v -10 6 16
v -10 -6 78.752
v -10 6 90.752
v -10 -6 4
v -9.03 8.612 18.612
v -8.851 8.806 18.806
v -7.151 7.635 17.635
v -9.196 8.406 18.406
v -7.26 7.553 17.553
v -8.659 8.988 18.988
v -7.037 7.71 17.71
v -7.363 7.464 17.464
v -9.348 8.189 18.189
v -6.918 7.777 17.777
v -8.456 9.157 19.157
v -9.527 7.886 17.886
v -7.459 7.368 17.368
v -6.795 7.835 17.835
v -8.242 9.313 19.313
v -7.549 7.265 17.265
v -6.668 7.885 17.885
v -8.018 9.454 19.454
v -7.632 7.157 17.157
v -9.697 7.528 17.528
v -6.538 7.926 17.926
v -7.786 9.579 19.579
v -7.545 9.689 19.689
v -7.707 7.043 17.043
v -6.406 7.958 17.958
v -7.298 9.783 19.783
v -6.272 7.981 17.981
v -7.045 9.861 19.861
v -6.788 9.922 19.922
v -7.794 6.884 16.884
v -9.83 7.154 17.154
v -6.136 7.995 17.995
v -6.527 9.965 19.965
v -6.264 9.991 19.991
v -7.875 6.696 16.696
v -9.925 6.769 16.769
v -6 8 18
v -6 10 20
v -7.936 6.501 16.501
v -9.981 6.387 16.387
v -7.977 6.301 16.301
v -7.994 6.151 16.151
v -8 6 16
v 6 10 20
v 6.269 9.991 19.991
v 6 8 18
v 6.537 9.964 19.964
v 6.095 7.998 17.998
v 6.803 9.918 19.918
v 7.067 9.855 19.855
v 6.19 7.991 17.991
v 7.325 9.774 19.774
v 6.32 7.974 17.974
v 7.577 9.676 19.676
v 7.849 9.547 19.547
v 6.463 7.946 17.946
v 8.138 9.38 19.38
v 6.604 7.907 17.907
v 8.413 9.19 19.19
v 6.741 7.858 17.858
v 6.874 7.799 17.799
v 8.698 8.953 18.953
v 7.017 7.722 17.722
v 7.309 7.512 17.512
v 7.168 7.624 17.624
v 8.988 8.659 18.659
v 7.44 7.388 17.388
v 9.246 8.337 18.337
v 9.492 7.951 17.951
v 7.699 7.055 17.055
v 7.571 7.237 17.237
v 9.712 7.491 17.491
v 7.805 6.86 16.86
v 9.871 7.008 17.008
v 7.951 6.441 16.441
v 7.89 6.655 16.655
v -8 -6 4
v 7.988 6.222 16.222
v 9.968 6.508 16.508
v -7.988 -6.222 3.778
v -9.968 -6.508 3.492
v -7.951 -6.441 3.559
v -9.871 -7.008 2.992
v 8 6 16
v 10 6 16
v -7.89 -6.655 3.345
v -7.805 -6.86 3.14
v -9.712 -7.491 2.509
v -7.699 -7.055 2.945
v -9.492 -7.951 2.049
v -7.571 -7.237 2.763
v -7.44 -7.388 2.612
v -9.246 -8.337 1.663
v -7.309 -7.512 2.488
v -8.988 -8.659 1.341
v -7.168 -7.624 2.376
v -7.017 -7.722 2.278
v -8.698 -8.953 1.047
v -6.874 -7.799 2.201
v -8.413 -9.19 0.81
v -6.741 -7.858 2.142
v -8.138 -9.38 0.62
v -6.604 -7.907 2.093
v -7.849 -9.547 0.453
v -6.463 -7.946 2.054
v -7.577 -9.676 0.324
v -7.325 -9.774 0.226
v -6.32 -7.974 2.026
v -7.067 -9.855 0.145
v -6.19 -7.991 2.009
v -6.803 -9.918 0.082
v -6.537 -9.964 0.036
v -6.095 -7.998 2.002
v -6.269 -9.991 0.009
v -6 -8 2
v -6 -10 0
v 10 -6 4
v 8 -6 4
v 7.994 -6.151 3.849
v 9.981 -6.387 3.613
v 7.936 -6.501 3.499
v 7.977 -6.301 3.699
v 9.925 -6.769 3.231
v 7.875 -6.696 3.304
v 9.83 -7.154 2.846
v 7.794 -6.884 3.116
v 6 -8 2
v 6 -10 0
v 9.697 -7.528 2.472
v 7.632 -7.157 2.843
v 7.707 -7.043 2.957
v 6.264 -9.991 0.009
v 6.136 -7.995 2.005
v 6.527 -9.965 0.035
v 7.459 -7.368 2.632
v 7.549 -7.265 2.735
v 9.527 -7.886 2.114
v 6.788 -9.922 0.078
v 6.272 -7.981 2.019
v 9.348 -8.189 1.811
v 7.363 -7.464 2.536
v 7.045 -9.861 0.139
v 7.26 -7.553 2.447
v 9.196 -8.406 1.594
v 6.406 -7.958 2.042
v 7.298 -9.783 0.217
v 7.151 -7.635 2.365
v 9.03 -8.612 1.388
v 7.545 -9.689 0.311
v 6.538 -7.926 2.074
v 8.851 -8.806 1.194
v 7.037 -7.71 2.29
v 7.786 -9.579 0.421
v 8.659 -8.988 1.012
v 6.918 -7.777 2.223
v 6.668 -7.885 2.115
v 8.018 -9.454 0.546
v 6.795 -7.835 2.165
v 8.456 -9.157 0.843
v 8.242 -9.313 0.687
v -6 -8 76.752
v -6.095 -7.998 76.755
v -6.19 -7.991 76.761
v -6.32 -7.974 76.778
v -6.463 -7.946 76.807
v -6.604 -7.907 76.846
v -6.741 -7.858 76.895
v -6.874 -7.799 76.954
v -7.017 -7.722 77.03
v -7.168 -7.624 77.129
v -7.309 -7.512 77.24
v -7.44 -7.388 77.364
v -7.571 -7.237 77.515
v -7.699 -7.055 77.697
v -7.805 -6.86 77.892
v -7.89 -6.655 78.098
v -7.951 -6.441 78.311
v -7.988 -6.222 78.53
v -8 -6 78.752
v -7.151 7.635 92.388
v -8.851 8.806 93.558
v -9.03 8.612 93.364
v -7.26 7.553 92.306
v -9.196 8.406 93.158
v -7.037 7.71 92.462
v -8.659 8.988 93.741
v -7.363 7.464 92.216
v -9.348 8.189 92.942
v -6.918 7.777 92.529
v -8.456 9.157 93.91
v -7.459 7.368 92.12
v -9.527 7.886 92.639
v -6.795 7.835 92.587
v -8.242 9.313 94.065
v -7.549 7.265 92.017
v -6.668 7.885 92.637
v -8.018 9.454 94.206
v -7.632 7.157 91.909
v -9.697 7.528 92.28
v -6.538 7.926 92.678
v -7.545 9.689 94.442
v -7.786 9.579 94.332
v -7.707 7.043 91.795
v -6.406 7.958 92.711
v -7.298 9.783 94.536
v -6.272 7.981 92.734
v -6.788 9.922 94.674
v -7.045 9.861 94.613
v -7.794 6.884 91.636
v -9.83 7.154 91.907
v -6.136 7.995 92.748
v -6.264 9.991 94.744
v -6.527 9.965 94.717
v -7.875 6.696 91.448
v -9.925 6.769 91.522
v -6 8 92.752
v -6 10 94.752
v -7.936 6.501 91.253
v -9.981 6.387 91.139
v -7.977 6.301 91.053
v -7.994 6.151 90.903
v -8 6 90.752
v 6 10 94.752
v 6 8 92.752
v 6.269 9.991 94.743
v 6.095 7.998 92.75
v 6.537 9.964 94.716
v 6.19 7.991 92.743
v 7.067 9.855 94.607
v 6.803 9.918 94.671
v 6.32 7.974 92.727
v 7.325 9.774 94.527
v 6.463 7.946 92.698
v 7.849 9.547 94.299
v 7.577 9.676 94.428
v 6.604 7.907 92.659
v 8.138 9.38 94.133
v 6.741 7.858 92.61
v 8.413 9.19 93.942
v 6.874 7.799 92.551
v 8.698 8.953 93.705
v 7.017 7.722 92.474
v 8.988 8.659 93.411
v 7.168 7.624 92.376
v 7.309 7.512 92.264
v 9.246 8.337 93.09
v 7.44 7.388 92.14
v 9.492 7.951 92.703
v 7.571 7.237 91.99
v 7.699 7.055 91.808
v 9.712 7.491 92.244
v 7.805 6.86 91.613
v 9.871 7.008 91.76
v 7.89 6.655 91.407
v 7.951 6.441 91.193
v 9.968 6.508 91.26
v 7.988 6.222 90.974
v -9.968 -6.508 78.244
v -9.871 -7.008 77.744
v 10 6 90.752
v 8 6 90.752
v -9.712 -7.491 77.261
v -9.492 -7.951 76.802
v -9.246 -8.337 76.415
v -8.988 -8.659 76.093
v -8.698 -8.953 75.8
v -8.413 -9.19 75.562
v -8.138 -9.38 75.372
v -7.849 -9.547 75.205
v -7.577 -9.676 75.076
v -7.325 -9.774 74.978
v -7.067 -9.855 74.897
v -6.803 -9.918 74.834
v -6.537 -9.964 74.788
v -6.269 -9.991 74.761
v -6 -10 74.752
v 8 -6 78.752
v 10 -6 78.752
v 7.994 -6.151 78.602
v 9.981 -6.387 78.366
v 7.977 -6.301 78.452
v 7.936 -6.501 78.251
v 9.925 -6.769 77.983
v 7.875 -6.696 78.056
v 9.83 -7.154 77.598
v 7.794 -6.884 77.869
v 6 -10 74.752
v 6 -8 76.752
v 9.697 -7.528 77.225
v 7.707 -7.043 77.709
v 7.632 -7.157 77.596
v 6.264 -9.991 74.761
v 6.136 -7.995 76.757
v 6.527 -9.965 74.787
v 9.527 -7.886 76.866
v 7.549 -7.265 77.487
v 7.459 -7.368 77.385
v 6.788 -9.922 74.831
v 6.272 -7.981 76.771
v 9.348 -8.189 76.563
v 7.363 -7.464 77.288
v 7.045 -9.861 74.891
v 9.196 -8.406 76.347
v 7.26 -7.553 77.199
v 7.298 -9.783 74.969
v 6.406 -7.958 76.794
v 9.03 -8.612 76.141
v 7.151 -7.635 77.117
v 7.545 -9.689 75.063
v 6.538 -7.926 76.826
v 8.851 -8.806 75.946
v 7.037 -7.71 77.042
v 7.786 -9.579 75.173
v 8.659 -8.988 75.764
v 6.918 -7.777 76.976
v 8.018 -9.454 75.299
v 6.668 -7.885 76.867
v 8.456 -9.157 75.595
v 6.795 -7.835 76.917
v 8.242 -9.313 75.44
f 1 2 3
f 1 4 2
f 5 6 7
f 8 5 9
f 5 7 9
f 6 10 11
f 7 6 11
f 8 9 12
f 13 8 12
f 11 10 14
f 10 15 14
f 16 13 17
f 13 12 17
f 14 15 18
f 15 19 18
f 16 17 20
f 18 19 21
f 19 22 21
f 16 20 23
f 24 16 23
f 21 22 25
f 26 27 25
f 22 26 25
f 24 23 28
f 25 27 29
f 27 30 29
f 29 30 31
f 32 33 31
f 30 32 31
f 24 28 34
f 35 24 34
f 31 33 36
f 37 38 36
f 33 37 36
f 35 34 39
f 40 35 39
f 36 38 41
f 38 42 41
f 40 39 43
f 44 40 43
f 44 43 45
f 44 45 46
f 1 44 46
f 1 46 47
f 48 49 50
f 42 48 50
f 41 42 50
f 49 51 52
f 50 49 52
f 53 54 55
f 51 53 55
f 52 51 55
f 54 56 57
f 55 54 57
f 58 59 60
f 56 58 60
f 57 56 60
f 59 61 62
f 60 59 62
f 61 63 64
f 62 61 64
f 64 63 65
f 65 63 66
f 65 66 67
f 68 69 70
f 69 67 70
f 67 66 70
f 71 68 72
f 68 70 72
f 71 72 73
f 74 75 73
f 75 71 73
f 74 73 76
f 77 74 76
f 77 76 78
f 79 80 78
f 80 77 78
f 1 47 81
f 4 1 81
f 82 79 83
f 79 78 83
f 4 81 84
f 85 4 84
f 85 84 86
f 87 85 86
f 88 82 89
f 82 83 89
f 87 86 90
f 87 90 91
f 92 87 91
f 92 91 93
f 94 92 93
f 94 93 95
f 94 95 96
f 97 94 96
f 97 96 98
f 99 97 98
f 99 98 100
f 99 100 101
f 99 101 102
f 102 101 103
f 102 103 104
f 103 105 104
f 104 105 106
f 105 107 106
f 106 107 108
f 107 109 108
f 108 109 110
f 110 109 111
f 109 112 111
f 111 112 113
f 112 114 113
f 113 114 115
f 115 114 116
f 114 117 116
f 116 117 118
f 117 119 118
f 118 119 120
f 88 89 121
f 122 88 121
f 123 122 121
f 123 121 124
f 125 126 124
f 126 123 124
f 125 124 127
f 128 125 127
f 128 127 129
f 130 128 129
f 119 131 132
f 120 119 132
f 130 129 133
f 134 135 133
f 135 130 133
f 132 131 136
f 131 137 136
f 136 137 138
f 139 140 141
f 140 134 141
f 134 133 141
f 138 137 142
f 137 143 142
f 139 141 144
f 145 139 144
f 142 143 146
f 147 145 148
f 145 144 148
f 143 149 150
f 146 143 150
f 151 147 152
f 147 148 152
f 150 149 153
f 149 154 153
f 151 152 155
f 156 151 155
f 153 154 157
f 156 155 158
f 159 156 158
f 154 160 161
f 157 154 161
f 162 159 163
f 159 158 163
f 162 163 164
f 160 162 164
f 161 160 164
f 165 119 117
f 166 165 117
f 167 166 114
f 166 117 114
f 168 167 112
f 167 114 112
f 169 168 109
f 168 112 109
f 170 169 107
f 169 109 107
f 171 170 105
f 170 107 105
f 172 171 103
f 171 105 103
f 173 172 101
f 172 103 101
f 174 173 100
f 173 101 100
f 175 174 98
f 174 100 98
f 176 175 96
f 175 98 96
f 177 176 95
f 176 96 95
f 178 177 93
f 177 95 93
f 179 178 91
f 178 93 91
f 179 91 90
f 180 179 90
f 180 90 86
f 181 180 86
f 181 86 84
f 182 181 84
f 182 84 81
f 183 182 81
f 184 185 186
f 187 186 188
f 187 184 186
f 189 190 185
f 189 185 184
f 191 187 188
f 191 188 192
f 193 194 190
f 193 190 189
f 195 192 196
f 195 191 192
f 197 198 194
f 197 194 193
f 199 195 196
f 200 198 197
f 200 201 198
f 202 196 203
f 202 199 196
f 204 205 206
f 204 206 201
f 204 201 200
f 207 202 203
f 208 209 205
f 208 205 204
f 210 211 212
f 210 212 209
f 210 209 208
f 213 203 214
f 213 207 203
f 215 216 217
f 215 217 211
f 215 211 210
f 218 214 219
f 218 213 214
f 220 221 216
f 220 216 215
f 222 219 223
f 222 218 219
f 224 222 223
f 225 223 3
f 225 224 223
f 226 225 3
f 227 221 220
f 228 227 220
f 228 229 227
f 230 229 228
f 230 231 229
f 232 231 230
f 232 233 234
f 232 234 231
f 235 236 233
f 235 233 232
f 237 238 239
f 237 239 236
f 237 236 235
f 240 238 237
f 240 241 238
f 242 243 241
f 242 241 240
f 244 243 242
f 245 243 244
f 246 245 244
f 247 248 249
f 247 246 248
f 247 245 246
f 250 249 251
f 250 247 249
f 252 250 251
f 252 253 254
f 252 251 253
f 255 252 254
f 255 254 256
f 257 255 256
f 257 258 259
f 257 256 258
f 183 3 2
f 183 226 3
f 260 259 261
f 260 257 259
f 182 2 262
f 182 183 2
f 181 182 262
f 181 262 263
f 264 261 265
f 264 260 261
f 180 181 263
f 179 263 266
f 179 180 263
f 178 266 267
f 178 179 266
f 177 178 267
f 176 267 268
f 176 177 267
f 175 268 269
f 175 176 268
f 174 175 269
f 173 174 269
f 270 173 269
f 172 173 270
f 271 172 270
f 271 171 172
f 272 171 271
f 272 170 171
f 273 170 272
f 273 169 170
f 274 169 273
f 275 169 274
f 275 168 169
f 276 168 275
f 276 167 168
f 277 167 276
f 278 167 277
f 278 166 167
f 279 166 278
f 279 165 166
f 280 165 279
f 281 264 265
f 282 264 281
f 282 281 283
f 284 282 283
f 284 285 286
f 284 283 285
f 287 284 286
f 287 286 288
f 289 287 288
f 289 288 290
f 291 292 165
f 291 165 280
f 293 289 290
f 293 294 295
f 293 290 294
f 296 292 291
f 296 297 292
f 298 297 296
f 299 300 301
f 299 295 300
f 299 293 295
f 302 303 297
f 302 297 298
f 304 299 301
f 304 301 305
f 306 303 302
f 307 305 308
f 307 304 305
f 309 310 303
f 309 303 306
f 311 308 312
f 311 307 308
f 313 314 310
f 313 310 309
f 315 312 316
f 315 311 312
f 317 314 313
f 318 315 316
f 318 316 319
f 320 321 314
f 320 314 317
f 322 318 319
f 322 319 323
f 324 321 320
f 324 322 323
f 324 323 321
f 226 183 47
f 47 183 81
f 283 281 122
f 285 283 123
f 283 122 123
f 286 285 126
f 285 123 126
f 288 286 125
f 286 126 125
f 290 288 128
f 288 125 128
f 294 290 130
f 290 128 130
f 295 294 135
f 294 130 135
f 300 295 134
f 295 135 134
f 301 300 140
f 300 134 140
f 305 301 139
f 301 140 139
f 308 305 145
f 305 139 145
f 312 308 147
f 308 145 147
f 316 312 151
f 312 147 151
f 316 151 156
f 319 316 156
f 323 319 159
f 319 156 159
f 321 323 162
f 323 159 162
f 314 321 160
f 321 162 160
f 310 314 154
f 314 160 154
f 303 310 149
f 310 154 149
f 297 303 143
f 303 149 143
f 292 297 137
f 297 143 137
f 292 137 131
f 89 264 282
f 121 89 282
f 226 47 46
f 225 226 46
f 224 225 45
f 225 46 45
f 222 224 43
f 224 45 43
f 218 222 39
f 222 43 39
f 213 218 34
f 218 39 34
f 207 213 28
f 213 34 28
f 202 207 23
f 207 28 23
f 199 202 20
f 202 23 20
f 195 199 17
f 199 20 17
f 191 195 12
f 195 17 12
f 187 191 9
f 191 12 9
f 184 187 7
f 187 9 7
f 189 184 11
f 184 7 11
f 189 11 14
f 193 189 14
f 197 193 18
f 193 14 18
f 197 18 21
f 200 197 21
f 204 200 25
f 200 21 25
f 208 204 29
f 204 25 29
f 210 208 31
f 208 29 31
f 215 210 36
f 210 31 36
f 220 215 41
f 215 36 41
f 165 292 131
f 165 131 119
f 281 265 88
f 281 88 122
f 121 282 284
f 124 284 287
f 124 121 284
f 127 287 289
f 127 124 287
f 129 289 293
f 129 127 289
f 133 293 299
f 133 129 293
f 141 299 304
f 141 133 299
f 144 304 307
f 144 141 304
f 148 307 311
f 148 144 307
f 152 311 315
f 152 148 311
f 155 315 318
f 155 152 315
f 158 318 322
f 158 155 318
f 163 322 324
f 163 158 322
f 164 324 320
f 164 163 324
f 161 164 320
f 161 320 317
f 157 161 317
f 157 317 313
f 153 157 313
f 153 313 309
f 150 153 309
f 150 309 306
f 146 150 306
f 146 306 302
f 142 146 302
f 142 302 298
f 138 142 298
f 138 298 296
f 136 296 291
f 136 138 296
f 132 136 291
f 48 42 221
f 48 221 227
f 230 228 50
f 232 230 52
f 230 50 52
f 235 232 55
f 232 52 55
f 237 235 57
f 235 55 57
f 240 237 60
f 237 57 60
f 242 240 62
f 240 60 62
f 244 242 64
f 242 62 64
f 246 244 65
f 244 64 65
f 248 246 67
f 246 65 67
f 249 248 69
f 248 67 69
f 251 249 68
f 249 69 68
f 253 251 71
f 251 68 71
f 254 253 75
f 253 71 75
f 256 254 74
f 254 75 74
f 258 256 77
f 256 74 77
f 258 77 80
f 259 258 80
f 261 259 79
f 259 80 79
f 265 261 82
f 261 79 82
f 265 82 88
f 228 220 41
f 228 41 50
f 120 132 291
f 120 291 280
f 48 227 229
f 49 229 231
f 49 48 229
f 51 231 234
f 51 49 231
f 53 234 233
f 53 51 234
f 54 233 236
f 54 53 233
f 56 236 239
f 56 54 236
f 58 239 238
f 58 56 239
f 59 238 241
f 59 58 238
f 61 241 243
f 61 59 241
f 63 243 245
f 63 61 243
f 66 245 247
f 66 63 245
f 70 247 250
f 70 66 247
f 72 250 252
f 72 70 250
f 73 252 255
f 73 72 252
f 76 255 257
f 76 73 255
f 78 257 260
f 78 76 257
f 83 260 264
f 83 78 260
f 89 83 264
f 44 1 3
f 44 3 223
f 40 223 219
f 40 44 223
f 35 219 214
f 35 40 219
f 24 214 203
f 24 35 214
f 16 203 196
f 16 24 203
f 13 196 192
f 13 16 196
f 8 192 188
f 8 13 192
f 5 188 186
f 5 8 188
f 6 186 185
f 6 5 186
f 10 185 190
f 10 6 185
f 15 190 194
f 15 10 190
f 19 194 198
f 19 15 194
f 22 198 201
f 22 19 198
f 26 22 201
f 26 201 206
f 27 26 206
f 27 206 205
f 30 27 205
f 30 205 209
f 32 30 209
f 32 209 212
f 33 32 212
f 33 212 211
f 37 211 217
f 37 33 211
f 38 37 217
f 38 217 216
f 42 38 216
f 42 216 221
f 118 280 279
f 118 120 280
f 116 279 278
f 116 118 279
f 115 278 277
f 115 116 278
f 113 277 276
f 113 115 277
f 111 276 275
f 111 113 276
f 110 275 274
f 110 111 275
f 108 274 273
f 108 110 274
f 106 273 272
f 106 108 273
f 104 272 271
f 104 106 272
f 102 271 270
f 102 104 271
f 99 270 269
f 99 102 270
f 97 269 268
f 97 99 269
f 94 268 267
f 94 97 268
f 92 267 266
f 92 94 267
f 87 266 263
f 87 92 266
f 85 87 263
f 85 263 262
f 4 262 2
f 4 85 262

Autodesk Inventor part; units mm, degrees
ref_plane "YZ Plane" through (0, 0, 0) normal (1, 0, 0) x (0, 1, 0)
ref_plane "Start Plane" through (0, 0, 0) normal (0, 0, 1) x (1, 0, 0)
ref_plane "End Plane" through (0, 0, 94.7523) normal (0, 0, 1) x (1, 0, 0)
sketch "Sketch" plane through (0, 0, 0) normal (0, 0, 1) x (1, 0, 0)
  line L0 (-10, -6) -> (-10, 6)
  line L1 (-6, 10) -> (6, 10)
  line L2 (10, 6) -> (10, -6)
  line L3 (6, -10) -> (-6, -10)
  arc A0 (-10, -6) -> (-6, -10) centre (-6, -6) ccw
  arc A1 (10, 6) -> (6, 10) centre (6, 6) ccw
  arc A2 (-6, 10) -> (-10, 6) centre (-6, 6) ccw
  arc A3 (6, -10) -> (10, -6) centre (6, -6) ccw
  arc A4 (-6, 8) -> (-8, 6) centre (-6, 6) ccw
  line L4 (-6, 8) -> (6, 8)
  arc A5 (8, 6) -> (6, 8) centre (6, 6) ccw
  line L5 (8, 6) -> (8, -6)
  arc A6 (6, -8) -> (8, -6) centre (6, -6) ccw
  line L6 (6, -8) -> (-6, -8)
  arc A7 (-8, -6) -> (-6, -8) centre (-6, -6) ccw
  line L7 (-8, -6) -> (-8, 6)
  line L8 (0, 15.1598) -> (0, -15.1598) construction
  line L9 (-15.1598, 0) -> (15.1598, 0) construction
  dimension "d7" = 4
  dimension "d9" = 20
  dimension "d11" = 20
  dimension "d12" = 2
  dimension "d15" = 10
  dimension "d16" = 10
extrude "Body" add sketch "Sketch" along normal up to surface (94.7523 mm away) from surface at 0
sketch "Sketch3" plane through (0, 0, 0) normal (0, 0, 1) x (1, 0, 0)
  line L0 (0, 0) -> (10, 0)
ref_plane "Work Plane3" through (0, 0, 0) normal (0, -1, 0) x (1, 0, 0)
sketch "Sketch5" plane through (10, -6, 94.7523) normal (1, 0, 0) x (0, 0, -1)
  line L0 (0, 12) -> (0, 16) projected
  line L1 (0, 16) -> (20, -4)
  line L2 (94.7523, -4) -> (0, -4) projected
  line L3 (94.7523, 16) -> (0, 16) projected
  line L4 (74.7523, 16) -> (94.7523, -4)
  line L5 (0, 12) -> (0, 0) projected
  line L6 (0, -4) -> (0, 0) projected
  line L7 (94.7523, -4) -> (0, -4) projected
  line L8 (94.7523, 12) -> (94.7523, 0) projected
  line L9 (94.7523, 12) -> (94.7523, 16) projected
  line L10 (94.7523, -4) -> (94.7523, 0) projected
  point P0 (94.7523, 6)
  point P1 (84.7523, 6)
  dimension "d19" = 45
extrude "Extrusion2" cut sketch "Sketch5" against normal through all contours L0 L1 L2 L6 L5 | L3 L9 L8 L10 L4
sketch "Sketch4" plane through (0, 0, 0) normal (0, -1, 0) x (1, 0, 0)
  line L0 (-2, 0) -> (12, 0) projected
  line L1 (-2, 94.7523) -> (12, 94.7523) projected
  dimension "d18" = 94.7523
equation "\"d7\" = G_IR"
equation "\"d9\" = G_W"
equation "\"d11\" = G_H"
equation "\"d12\" = G_T"
equation "\"d15\" = 0.5 * d9"
equation "\"d16\" = 0.5 * d11"
equation "\"d3\" = G_L"
equation "\"G_W\" = 20"
equation "\"G_H\" = 20"
equation "\"G_T\" = 2"
equation "\"G_IR\" = 4"
equation "\"G_L\" = d18"
equation "\"G_OFFSET_START\" = 0"
equation "\"G_OFFSET_END\" = 0"
equation "\"d14\" = G_OFFSET_END + B_L"
equation "\"B_L\" = 94.75231"
properties part number "ISO 10799-2 - 20x20x2 - 94,75" material "Steel, Mild"
